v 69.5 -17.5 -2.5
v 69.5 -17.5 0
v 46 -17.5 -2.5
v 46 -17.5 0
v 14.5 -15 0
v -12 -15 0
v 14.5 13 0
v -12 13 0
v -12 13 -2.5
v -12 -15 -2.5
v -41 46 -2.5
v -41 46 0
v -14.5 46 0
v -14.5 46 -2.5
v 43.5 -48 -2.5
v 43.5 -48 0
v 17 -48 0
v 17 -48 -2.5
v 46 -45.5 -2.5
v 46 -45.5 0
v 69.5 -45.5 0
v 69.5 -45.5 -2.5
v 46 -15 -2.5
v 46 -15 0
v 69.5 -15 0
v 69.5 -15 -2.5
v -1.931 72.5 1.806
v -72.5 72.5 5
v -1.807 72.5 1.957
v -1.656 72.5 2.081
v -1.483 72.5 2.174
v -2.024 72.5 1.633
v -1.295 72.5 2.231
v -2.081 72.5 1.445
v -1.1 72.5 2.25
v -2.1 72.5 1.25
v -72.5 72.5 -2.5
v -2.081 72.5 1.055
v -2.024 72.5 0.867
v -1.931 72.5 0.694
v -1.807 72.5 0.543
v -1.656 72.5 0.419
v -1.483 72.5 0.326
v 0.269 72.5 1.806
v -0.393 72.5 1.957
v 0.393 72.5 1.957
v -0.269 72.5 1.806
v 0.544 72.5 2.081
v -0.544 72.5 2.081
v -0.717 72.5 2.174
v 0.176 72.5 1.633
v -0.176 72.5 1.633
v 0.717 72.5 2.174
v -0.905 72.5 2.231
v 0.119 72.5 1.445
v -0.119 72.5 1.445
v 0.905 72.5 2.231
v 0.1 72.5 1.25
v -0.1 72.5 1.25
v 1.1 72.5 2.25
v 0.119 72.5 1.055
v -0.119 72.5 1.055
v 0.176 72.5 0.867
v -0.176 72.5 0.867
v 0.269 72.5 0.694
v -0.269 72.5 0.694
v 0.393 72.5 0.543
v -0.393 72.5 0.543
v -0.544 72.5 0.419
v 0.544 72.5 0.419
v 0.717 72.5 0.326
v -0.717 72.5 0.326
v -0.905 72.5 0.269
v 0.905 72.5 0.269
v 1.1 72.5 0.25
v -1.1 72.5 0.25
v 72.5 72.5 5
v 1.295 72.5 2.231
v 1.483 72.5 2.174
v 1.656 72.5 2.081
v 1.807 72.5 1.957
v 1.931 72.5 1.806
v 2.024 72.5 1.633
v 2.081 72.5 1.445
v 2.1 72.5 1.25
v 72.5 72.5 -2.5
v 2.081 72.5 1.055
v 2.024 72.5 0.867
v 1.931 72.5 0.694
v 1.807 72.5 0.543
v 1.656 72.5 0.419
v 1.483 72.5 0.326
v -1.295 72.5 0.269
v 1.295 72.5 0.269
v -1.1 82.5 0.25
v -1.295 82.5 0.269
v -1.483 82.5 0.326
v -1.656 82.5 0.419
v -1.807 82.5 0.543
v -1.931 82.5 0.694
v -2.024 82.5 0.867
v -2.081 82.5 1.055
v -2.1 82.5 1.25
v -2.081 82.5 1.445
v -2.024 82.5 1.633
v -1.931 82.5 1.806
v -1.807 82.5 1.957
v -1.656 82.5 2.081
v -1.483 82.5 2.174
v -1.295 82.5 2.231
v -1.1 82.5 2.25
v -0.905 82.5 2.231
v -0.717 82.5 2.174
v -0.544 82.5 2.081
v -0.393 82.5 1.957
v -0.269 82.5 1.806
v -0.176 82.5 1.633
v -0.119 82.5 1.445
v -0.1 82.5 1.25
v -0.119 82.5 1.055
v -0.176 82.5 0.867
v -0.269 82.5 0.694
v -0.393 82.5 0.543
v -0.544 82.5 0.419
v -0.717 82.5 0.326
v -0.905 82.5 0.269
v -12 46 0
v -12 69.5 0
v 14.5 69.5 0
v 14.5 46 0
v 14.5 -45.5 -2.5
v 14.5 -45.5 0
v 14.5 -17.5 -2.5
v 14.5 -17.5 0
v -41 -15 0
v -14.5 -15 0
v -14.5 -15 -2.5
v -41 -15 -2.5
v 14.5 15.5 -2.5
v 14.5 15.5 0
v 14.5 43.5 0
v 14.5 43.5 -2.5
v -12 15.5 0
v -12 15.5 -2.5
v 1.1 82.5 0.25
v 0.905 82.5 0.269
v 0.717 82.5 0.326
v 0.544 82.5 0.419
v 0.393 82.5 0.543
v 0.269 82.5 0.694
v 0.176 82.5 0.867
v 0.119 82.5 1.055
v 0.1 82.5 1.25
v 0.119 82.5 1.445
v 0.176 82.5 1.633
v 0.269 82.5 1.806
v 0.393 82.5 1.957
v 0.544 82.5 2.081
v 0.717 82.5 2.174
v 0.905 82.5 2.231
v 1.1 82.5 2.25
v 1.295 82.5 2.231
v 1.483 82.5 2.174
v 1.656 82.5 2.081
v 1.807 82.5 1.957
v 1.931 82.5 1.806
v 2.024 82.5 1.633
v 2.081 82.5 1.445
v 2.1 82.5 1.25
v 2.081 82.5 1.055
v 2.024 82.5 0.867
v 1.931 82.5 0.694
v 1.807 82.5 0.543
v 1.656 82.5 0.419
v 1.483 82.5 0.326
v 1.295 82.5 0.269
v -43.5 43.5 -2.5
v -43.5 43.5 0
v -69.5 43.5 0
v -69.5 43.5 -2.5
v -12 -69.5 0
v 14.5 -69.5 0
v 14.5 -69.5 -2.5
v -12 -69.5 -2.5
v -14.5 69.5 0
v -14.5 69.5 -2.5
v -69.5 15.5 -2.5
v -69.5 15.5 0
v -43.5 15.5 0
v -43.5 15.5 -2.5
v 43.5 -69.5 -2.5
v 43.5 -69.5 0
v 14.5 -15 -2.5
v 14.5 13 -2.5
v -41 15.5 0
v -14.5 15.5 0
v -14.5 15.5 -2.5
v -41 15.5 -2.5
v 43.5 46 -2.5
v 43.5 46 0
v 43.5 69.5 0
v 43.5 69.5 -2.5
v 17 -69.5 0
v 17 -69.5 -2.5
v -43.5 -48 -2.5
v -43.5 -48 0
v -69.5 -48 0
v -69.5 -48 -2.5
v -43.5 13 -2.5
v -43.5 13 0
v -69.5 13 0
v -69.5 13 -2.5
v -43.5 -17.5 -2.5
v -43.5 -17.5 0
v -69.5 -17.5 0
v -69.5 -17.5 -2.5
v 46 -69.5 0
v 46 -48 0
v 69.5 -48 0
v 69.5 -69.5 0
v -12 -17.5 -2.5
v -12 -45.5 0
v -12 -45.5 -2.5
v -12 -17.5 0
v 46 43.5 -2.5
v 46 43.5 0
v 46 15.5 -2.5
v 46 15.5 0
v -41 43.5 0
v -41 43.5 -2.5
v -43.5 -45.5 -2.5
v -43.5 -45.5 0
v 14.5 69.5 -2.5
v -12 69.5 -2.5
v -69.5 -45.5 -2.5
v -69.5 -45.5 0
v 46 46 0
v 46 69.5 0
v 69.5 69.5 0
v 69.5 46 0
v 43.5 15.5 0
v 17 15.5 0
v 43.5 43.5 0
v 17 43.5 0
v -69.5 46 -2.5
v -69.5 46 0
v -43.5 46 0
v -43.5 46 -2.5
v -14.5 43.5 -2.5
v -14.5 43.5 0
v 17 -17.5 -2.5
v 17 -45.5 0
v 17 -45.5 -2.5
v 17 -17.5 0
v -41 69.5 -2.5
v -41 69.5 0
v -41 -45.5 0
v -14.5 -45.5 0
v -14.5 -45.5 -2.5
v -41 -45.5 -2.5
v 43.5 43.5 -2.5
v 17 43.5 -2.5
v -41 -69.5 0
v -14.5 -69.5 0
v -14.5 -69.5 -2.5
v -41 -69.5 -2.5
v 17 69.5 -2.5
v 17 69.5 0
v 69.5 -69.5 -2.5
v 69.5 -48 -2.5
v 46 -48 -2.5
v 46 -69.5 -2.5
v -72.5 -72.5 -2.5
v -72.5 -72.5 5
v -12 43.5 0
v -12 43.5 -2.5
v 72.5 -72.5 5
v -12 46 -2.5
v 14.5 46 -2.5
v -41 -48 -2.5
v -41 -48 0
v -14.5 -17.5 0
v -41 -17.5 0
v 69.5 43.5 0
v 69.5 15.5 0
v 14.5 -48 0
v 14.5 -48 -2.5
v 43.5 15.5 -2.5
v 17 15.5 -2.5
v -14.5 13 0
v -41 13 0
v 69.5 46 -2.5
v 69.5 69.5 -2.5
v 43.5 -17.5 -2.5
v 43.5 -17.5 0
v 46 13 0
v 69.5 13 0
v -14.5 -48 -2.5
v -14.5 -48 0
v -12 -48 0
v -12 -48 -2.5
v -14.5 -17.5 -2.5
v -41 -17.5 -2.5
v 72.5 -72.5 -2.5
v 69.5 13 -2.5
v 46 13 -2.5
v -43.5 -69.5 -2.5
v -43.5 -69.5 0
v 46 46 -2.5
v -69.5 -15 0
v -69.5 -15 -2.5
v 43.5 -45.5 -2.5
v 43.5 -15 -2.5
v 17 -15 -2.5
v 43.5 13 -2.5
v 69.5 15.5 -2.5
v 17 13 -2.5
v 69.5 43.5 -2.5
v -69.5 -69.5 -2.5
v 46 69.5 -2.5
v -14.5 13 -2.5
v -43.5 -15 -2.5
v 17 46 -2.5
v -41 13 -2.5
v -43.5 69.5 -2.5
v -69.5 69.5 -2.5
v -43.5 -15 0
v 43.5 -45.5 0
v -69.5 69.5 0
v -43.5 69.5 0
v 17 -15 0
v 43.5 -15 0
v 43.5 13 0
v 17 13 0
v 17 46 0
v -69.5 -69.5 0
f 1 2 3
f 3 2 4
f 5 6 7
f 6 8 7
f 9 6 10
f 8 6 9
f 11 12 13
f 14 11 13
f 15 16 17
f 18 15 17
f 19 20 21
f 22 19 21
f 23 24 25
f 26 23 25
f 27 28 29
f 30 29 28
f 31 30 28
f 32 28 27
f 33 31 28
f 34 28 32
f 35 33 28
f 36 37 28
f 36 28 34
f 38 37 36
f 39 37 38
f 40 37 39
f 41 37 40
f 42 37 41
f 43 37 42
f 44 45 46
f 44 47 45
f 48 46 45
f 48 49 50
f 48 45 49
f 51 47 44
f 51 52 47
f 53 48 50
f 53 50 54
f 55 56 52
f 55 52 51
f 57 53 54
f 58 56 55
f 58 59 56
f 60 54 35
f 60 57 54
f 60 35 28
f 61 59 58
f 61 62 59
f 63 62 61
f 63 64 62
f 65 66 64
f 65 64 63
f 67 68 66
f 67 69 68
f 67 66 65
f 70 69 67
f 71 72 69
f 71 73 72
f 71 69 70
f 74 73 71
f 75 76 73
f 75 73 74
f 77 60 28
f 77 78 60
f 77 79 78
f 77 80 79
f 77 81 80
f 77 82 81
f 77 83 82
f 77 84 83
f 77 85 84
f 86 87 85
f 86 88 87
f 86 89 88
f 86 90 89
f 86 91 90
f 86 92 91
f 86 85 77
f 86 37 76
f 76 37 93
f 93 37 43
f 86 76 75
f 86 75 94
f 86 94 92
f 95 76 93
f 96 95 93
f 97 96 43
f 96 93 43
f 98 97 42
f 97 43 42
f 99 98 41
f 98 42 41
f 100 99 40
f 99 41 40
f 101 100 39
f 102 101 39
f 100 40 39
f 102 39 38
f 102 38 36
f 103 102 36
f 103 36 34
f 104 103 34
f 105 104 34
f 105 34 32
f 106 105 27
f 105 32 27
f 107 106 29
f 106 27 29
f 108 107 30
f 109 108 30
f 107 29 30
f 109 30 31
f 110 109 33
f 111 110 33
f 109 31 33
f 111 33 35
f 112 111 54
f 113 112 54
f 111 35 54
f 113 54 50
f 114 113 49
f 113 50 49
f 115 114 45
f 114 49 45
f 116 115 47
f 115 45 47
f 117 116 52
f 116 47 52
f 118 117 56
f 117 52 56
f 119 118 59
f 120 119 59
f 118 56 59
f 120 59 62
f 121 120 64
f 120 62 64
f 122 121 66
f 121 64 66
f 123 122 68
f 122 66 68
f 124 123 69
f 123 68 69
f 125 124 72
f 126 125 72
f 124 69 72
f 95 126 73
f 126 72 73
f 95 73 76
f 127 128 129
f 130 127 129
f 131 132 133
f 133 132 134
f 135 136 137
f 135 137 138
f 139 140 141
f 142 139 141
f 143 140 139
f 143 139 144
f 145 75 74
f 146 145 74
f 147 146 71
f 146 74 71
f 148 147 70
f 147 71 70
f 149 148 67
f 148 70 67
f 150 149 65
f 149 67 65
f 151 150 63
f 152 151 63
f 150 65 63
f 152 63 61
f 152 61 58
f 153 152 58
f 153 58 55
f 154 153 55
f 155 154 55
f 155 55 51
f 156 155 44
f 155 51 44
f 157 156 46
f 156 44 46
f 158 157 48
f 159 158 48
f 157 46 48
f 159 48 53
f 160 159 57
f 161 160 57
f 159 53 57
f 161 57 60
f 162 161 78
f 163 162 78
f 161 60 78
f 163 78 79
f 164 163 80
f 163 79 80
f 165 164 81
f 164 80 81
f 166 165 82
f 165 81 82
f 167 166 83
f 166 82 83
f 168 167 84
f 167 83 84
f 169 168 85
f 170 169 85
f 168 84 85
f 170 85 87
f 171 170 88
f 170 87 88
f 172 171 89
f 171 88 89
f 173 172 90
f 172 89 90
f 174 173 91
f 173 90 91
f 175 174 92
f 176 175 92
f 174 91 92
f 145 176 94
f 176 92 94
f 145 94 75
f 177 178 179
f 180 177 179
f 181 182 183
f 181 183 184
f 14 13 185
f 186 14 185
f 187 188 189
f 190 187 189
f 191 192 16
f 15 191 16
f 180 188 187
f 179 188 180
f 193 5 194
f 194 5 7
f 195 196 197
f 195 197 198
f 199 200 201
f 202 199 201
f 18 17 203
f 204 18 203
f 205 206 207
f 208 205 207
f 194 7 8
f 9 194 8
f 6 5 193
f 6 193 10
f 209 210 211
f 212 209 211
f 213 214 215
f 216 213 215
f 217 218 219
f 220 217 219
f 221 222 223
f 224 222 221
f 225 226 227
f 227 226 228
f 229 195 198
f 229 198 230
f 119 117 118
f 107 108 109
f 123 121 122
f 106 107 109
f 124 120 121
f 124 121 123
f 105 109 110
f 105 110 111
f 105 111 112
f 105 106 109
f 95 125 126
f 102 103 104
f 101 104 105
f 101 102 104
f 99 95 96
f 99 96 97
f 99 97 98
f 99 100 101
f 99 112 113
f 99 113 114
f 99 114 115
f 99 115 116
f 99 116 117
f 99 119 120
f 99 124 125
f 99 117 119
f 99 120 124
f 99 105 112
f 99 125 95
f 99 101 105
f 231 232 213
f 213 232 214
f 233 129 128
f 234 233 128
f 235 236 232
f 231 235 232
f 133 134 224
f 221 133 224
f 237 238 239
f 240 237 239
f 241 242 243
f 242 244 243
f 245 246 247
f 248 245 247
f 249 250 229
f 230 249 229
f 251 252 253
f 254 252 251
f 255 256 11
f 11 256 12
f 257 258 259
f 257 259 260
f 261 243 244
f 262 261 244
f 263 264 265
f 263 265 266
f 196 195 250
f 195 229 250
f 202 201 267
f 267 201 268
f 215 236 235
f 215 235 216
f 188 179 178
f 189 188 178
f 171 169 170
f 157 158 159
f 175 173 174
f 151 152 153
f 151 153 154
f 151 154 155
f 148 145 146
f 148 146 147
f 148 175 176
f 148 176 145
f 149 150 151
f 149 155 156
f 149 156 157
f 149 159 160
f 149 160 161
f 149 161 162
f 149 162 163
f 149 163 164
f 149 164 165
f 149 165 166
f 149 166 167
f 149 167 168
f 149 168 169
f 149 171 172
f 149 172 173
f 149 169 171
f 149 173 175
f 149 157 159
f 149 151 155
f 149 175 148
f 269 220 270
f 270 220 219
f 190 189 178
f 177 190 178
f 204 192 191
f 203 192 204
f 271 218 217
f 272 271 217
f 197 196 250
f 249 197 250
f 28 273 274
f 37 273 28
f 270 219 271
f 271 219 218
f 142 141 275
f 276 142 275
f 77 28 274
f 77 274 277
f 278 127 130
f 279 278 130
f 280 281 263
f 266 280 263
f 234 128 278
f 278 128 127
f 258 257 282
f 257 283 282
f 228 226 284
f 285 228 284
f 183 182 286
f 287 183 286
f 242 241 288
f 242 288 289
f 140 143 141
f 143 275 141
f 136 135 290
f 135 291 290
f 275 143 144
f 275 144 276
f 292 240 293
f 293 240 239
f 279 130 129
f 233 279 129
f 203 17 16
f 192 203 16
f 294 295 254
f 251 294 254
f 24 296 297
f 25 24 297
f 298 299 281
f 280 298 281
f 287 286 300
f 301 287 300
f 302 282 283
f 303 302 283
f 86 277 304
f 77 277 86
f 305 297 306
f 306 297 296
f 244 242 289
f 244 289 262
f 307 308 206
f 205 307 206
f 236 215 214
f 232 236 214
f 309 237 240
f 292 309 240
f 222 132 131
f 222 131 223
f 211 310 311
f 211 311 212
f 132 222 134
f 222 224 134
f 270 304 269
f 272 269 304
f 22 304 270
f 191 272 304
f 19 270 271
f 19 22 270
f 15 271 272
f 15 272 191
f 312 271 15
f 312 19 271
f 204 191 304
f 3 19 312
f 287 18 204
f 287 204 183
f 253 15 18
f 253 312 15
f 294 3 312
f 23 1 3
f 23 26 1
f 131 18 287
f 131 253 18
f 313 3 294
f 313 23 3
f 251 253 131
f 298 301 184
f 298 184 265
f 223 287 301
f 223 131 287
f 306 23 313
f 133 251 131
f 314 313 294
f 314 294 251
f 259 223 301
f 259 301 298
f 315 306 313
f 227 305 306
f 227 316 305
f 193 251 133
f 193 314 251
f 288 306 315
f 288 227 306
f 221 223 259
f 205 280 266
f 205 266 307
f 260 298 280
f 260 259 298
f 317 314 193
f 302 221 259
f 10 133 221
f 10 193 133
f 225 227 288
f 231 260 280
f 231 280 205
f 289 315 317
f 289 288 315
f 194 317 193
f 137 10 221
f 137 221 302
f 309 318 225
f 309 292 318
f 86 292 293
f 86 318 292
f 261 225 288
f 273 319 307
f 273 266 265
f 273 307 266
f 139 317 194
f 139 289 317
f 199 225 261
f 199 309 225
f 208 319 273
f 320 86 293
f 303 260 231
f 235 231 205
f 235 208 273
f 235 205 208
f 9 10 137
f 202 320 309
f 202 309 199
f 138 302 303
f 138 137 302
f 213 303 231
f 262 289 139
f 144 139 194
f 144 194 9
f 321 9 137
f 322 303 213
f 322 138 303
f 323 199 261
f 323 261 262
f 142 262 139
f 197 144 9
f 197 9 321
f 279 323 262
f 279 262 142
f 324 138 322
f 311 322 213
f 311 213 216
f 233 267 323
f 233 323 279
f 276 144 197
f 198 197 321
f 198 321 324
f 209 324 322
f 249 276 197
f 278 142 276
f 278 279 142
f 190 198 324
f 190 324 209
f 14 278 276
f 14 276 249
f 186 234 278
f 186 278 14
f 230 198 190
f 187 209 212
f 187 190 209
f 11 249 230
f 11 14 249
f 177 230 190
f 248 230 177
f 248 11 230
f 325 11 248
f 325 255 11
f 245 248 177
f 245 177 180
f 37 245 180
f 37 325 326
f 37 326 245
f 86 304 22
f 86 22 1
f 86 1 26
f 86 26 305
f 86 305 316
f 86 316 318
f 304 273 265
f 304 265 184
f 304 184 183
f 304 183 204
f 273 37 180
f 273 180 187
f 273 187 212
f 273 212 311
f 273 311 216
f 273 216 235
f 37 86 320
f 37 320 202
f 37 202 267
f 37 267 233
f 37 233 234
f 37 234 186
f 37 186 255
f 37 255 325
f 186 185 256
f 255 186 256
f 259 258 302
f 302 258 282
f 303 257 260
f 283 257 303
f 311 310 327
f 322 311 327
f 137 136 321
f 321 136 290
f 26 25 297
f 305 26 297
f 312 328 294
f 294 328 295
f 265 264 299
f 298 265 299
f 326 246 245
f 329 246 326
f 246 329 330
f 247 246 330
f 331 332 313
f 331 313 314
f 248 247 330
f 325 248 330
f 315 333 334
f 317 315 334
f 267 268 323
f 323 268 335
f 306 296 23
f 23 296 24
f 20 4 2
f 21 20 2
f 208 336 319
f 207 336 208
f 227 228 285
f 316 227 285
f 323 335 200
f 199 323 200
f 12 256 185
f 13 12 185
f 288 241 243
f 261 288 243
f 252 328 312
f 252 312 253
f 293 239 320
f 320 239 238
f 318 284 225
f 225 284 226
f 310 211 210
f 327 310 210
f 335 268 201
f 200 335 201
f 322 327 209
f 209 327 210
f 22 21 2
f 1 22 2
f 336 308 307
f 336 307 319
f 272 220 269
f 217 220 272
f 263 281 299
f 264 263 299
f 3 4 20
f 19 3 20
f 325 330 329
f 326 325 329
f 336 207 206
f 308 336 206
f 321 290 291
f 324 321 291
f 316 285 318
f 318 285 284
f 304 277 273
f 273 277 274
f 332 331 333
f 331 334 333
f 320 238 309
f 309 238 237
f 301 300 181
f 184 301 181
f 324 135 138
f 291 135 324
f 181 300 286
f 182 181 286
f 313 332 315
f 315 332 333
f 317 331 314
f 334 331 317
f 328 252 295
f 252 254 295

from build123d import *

# Parameters (mm, degrees)
ESQUISSE1_W        = 145
ESQUISSE1_H        = 145
BOSS_EXTRU_1_DEPTH = 5
ESQUISSE2_W        = 26.5
ESQUISSE2_H        = 28
BOSS_EXTRU_2_DEPTH = 2.5
ESQUISSE3_W        = 145
ESQUISSE3_H        = 145
ESQUISSE3_W_2      = 139
ESQUISSE3_H_2      = 139
BOSS_EXTRU_3_DEPTH = 2.5
ESQUISSE4_R        = 1
BOSS_EXTRU_4_DEPTH = 10


with BuildPart() as part:
    # Esquisse1 → Boss.-Extru.1 (new body)
    with BuildSketch(Plane.XY):
        Rectangle(ESQUISSE1_W, ESQUISSE1_H)
    extrude(amount=BOSS_EXTRU_1_DEPTH)

    # Esquisse2 → Boss.-Extru.2 (add)
    with BuildSketch(Plane(origin=(0, 0, 0), x_dir=(-1, 0, 0), z_dir=(0, 0, -1))):
        Polygon((-14.5, -48), (12, -48), (12, -72.5), (14.5, -72.5), (14.5, -48), (41, -48), (41, -72.5), (43.5, -72.5), (43.5, -48), (72.5, -48), (72.5, -45.5), (43.5, -45.5), (43.5, -17.5), (72.5, -17.5), (72.5, -15), (43.5, -15), (43.5, 13), (72.5, 13), (72.5, 15.5), (43.5, 15.5), (43.5, 43.5), (72.5, 43.5), (72.5, 46), (43.5, 46), (43.5, 72.5), (41, 72.5), (41, 46), (14.5, 46), (14.5, 72.5), (12, 72.5), (12, 46), (-14.5, 46), (-14.5, 72.5), (-17, 72.5), (-17, 46), (-43.5, 46), (-43.5, 72.5), (-46, 72.5), (-46, 46), (-72.5, 46), (-72.5, 43.5), (-46, 43.5), (-46, 15.5), (-72.5, 15.5), (-72.5, 13), (-46, 13), (-46, -15), (-72.5, -15), (-72.5, -17.5), (-46, -17.5), (-46, -45.5), (-72.5, -45.5), (-72.5, -48), (-46, -48), (-46, -72.5), (-43.5, -72.5), (-43.5, -48), (-17, -48), (-17, -72.5), (-14.5, -72.5), align=None)
        with Locations((27.75, -31.5)):
            Rectangle(ESQUISSE2_W, ESQUISSE2_H, mode=Mode.SUBTRACT)
        with Locations((-30.25, -31.5)):
            Rectangle(ESQUISSE2_W, ESQUISSE2_H, mode=Mode.SUBTRACT)
        with Locations((-1.25, -31.5)):
            Rectangle(ESQUISSE2_W, ESQUISSE2_H, mode=Mode.SUBTRACT)
        with Locations((-30.25, -1)):
            Rectangle(ESQUISSE2_W, ESQUISSE2_H, mode=Mode.SUBTRACT)
        with Locations((-30.25, 29.5)):
            Rectangle(ESQUISSE2_W, ESQUISSE2_H, mode=Mode.SUBTRACT)
        with Locations((-1.25, -1)):
            Rectangle(ESQUISSE2_W, ESQUISSE2_H, mode=Mode.SUBTRACT)
        with Locations((27.75, -1)):
            Rectangle(ESQUISSE2_W, ESQUISSE2_H, mode=Mode.SUBTRACT)
        with Locations((-1.25, 29.5)):
            Rectangle(ESQUISSE2_W, ESQUISSE2_H, mode=Mode.SUBTRACT)
        with Locations((27.75, 29.5)):
            Rectangle(ESQUISSE2_W, ESQUISSE2_H, mode=Mode.SUBTRACT)
    extrude(amount=BOSS_EXTRU_2_DEPTH)

    # Esquisse3 → Boss.-Extru.3 (add)
    with BuildSketch(Plane(origin=(0, 0, 0), x_dir=(-1, 0, 0), z_dir=(0, 0, -1))):
        Rectangle(ESQUISSE3_W, ESQUISSE3_H)
        Rectangle(ESQUISSE3_W_2, ESQUISSE3_H_2, mode=Mode.SUBTRACT)
    extrude(amount=BOSS_EXTRU_3_DEPTH)

    # Esquisse4 → Boss.-Extru.4 (add)
    with BuildSketch(Plane(origin=(0, 72.5, 0), x_dir=(1, 0, 0), z_dir=(0, 1, 0))):
        with Locations(Location((-1.1, -1.25, 0), (0, 0, 90))):
            Circle(ESQUISSE4_R)
        with Locations(Location((1.1, -1.25, 0), (0, 0, 90))):
            Circle(ESQUISSE4_R)
    extrude(amount=BOSS_EXTRU_4_DEPTH)


solid = part.part
